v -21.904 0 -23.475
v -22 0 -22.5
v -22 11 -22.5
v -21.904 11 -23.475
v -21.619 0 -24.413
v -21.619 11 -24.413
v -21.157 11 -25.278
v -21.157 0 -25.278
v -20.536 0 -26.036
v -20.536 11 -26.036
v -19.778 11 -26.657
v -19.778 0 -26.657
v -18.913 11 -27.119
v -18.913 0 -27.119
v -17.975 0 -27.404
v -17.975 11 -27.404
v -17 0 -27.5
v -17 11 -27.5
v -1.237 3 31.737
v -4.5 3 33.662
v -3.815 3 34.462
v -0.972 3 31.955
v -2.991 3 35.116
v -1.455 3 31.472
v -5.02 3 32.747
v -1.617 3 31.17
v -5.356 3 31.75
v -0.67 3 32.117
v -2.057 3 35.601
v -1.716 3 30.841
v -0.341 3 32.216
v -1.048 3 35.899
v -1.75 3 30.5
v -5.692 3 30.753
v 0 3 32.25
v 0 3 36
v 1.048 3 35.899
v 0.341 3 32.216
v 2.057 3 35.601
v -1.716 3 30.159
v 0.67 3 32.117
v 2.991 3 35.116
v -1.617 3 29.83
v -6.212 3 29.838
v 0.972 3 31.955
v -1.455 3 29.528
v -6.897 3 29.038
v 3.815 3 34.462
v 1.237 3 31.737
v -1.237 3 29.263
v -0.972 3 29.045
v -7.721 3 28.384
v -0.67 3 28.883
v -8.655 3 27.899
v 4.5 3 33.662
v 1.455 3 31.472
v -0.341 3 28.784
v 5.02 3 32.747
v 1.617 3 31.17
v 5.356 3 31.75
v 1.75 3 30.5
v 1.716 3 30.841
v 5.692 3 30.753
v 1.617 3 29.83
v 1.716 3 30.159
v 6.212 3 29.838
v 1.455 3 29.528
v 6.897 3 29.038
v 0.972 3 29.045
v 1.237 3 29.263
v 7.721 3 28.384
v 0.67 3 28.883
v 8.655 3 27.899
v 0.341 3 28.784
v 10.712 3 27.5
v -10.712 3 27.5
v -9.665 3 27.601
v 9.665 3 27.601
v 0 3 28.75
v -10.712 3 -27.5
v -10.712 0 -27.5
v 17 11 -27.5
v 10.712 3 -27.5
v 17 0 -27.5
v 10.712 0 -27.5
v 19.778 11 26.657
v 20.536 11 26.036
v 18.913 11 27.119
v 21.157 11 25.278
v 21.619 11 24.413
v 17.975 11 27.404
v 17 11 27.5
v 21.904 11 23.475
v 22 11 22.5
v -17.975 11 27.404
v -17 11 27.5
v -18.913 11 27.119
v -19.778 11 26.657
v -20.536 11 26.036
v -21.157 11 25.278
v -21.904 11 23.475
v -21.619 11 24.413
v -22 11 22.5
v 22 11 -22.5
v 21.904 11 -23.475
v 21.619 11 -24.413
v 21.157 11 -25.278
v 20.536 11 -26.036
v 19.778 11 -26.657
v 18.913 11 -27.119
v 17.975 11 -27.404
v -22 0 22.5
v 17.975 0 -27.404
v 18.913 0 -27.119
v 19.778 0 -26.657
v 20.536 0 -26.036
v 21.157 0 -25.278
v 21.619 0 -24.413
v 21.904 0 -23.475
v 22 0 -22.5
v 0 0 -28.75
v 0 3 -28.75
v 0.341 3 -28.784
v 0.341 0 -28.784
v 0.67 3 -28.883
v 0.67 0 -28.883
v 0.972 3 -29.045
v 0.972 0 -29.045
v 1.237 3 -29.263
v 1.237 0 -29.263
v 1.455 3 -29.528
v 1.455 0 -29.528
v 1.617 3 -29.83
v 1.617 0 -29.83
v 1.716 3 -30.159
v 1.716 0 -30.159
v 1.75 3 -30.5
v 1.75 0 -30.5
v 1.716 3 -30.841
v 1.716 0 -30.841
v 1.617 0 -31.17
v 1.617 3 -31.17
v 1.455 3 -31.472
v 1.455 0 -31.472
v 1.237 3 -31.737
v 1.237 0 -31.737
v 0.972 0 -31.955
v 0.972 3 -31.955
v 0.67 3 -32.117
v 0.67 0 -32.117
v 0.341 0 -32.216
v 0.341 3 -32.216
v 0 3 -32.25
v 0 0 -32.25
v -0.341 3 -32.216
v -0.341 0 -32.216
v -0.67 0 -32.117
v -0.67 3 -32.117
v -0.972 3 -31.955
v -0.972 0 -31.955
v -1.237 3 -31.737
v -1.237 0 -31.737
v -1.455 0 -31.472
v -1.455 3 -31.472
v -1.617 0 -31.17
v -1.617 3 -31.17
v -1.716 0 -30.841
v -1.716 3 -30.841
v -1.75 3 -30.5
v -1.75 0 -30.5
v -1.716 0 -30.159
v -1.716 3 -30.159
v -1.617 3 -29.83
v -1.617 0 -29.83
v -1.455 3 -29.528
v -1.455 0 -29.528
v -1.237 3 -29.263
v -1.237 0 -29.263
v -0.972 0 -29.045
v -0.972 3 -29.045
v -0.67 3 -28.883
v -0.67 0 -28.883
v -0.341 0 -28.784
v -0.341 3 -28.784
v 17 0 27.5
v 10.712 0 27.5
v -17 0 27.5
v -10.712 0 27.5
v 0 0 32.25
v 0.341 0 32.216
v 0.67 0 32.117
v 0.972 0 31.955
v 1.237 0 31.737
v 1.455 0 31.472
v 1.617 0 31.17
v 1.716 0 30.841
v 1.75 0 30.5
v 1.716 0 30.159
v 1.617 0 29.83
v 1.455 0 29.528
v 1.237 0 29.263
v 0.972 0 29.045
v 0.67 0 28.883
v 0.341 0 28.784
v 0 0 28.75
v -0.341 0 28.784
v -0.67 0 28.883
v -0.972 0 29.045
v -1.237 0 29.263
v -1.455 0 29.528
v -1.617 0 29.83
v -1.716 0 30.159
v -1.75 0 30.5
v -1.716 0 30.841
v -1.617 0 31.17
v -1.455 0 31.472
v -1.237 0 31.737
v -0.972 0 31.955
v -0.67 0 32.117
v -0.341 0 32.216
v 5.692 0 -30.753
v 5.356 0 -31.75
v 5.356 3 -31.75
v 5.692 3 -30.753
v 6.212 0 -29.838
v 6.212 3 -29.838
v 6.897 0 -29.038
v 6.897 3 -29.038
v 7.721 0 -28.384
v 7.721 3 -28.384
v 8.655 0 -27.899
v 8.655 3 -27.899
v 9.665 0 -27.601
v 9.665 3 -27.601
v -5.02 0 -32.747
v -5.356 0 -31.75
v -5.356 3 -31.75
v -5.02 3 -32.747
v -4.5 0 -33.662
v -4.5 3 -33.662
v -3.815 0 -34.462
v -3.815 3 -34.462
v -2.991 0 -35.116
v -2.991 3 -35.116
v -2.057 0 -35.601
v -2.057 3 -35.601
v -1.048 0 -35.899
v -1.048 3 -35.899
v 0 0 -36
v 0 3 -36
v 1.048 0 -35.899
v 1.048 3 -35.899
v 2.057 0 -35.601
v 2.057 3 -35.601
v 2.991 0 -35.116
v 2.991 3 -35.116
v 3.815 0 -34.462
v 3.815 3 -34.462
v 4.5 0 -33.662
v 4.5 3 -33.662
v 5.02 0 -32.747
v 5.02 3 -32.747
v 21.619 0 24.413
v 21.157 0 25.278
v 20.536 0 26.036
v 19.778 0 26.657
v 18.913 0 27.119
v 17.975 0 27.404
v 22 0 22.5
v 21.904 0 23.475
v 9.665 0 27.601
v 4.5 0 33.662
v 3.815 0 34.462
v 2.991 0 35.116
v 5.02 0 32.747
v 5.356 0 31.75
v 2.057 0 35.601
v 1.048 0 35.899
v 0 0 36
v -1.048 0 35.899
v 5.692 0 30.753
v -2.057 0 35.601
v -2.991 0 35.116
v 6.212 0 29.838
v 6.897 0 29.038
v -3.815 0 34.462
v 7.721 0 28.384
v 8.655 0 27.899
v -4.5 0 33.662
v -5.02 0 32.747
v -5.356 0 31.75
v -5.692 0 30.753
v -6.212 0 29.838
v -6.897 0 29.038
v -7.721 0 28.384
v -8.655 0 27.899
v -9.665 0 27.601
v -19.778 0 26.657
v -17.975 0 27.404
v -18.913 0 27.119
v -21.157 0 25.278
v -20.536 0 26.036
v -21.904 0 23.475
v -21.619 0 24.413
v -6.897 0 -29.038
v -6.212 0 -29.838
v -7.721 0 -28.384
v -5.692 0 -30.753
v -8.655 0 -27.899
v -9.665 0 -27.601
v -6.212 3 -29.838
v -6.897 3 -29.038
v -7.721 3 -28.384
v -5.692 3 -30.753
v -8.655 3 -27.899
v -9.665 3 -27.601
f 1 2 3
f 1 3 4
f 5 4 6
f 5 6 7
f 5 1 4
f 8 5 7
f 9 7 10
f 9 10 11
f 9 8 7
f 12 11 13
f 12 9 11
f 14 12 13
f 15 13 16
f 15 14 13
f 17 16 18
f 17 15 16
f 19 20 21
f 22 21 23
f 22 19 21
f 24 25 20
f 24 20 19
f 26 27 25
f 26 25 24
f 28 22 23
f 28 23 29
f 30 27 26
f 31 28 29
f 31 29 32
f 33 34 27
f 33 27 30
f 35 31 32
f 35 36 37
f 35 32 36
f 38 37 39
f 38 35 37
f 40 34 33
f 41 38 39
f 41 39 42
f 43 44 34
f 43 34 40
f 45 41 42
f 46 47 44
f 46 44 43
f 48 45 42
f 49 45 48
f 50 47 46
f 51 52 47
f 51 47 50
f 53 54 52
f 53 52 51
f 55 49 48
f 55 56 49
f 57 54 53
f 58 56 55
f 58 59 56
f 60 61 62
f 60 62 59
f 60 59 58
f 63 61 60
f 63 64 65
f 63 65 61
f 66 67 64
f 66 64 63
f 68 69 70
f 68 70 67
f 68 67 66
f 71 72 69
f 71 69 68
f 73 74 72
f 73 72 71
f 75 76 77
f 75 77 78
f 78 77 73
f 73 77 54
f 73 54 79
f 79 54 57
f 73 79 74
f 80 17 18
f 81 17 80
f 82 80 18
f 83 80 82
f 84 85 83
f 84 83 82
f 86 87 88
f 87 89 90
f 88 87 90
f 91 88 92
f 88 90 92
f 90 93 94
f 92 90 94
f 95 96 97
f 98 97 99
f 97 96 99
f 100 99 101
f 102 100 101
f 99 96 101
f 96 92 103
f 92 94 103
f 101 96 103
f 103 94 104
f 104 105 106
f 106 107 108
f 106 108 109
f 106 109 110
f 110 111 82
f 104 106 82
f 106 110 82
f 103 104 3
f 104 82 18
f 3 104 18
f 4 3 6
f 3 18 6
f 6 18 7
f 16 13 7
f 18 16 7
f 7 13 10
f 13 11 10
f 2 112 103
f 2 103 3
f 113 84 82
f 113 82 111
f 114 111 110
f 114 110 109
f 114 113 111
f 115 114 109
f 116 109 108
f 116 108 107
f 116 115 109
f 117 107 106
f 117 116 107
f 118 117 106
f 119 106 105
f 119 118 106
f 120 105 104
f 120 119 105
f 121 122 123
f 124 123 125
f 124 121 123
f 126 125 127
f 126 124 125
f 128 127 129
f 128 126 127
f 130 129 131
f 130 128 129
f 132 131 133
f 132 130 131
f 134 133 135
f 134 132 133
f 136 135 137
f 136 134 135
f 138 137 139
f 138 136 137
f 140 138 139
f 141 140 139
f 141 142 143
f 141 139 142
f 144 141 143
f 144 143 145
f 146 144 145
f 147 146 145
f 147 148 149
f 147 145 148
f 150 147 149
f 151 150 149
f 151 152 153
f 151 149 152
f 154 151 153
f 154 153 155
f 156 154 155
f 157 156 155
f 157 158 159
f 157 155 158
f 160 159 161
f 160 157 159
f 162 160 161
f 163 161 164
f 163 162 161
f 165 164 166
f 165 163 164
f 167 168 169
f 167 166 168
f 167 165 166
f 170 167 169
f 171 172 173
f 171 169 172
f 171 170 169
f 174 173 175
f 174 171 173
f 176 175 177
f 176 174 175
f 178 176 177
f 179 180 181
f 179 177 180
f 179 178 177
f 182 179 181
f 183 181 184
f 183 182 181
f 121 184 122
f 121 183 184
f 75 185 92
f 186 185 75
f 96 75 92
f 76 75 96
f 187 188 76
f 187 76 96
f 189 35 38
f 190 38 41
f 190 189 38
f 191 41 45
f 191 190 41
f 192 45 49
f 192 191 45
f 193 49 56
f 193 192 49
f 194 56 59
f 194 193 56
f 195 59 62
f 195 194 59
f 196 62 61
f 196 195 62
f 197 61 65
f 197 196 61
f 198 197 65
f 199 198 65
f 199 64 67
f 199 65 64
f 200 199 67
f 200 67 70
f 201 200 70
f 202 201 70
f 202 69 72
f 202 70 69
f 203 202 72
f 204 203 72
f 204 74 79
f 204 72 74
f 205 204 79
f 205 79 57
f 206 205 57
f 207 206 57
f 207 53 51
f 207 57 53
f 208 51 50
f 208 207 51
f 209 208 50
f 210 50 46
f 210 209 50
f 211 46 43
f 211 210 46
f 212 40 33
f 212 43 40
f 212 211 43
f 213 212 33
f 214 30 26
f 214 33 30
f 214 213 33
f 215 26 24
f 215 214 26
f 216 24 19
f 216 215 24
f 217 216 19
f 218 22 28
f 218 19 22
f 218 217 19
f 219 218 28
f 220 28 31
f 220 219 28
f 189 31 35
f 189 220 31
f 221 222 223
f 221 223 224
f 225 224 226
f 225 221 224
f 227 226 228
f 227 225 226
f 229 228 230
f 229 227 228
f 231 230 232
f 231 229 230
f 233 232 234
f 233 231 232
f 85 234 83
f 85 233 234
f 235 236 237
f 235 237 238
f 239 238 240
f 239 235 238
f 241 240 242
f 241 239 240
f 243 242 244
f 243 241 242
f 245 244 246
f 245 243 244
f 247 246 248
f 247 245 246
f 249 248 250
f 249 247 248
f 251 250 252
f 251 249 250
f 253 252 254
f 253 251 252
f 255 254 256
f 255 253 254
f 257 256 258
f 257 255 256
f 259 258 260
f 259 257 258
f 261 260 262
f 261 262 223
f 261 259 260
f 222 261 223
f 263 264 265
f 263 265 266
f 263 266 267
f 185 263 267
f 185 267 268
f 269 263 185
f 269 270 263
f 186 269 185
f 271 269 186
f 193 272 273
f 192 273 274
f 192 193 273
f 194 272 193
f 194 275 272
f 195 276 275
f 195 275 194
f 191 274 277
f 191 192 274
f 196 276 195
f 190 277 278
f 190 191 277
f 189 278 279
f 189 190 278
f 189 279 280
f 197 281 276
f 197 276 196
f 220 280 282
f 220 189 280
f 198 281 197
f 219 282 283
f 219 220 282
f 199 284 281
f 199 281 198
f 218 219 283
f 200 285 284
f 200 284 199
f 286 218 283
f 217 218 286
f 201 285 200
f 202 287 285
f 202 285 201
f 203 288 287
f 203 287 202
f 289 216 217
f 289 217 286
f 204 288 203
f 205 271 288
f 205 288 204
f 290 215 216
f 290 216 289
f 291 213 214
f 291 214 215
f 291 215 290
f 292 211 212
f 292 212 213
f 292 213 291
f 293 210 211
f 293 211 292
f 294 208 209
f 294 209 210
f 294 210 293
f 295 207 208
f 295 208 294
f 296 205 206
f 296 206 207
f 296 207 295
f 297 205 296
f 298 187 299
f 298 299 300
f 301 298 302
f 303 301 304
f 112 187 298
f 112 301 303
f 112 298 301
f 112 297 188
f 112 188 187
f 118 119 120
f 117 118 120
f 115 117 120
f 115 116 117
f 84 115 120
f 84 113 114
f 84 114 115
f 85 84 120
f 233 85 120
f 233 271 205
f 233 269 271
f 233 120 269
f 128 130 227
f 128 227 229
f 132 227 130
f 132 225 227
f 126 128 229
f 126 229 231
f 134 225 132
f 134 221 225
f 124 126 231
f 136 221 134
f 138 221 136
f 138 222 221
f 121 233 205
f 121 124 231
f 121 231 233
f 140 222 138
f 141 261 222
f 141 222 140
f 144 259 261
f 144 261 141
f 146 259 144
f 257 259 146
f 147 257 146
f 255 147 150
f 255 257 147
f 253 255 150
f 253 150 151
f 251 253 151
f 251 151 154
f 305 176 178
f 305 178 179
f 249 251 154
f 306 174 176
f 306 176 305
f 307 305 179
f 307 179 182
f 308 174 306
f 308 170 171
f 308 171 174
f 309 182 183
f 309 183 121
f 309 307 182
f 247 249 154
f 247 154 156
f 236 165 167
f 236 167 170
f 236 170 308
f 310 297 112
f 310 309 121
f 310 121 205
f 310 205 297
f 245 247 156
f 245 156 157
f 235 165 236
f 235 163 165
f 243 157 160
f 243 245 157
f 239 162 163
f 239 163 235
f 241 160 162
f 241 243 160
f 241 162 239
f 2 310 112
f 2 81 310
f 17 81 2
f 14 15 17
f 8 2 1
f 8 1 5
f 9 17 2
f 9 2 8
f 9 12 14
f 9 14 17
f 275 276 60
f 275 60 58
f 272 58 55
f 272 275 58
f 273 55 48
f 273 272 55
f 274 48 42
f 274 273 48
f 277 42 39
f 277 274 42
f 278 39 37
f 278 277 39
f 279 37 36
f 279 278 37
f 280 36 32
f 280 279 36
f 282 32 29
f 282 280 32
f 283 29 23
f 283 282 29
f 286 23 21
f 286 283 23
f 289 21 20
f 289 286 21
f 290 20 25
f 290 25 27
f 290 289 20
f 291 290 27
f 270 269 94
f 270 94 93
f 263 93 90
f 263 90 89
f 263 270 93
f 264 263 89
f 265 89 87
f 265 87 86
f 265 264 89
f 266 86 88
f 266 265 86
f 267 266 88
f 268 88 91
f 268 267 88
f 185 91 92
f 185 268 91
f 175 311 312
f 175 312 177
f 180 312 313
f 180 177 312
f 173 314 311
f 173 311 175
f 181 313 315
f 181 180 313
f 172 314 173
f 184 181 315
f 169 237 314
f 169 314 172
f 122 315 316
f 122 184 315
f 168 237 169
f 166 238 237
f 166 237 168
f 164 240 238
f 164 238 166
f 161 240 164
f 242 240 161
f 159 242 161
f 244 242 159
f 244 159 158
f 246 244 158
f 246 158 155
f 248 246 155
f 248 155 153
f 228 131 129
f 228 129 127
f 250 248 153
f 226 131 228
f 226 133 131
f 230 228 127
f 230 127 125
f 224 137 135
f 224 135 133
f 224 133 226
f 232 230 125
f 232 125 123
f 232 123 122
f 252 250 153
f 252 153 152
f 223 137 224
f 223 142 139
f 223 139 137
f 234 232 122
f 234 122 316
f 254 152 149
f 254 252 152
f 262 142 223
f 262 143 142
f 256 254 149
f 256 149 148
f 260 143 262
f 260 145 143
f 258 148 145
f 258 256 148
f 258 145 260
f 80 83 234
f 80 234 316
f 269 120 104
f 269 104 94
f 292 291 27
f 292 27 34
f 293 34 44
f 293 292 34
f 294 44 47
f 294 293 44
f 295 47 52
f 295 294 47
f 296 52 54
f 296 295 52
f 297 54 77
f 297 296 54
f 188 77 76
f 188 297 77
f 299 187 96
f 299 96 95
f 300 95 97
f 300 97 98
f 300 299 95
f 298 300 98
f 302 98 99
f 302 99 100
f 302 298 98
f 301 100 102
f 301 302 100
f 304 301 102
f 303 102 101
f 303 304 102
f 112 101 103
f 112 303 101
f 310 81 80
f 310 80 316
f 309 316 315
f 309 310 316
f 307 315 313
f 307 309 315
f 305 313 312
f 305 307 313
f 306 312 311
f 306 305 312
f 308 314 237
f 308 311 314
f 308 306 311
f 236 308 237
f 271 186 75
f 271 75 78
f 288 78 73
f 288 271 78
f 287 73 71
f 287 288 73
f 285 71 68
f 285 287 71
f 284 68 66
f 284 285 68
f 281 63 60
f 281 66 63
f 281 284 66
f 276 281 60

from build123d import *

# Parameters (mm, degrees)
SKETCH1_R           = 1.75
BOSS_EXTRUDE1_DEPTH = 11
SKETCH2_W           = 27.712142642
SKETCH2_H           = 8.5
CUT_EXTRUDE1_DEPTH  = 8


with BuildPart() as part:
    # Sketch1 → Boss-Extrude1 (new body)
    with BuildSketch(Plane(origin=(0, 0, 0), x_dir=(1, 0, 0), z_dir=(0, 1, 0))):
        with BuildLine():
            Line((17, -27.5), (10.712142643, -27.5))
            ThreePointArc((10.712142643, -27.5), (7.29344406, -28.691578015), (5.356071321, -31.75))
            ThreePointArc((5.356071321, -31.75), (0, -36), (-5.356071321, -31.75))
            ThreePointArc((-5.356071321, -31.75), (-7.29344406, -28.691578015), (-10.712142643, -27.5))
            Line((-10.712142643, -27.5), (-17, -27.5))
            ThreePointArc((-17, -27.5), (-20.535533906, -26.035533906), (-22, -22.5))
            Line((-22, -22.5), (-22, 22.5))
            ThreePointArc((-22, 22.5), (-20.535533906, 26.035533906), (-17, 27.5))
            Line((-17, 27.5), (-10.712142643, 27.5))
            ThreePointArc((-10.712142643, 27.5), (-7.29344406, 28.691578015), (-5.356071321, 31.75))
            ThreePointArc((-5.356071321, 31.75), (0, 36), (5.356071321, 31.75))
            ThreePointArc((5.356071321, 31.75), (7.29344406, 28.691578015), (10.712142643, 27.5))
            Line((10.712142643, 27.5), (17, 27.5))
            ThreePointArc((17, 27.5), (20.535533906, 26.035533906), (22, 22.5))
            Line((22, 22.5), (22, -22.5))
            ThreePointArc((22, -22.5), (20.535533906, -26.035533906), (17, -27.5))
        make_face()
        with Locations(Location((0, -30.5, 0), (0, 0, 270))):
            Circle(SKETCH1_R, mode=Mode.SUBTRACT)
        with Locations(Location((0, 30.5, 0), (0, 0, 270))):
            Circle(SKETCH1_R, mode=Mode.SUBTRACT)
    extrude(amount=BOSS_EXTRUDE1_DEPTH)

    # Sketch2 → Cut-Extrude1 (cut)
    with BuildSketch(Plane(origin=(0, 11, 0), x_dir=(1, 0, 0), z_dir=(0, 1, 0))):
        with Locations((0, -31.75)):
            Rectangle(SKETCH2_W, SKETCH2_H)
        with Locations((0, 31.75)):
            Rectangle(SKETCH2_W, SKETCH2_H)
    extrude(amount=-CUT_EXTRUDE1_DEPTH, mode=Mode.SUBTRACT)


solid = part.part
